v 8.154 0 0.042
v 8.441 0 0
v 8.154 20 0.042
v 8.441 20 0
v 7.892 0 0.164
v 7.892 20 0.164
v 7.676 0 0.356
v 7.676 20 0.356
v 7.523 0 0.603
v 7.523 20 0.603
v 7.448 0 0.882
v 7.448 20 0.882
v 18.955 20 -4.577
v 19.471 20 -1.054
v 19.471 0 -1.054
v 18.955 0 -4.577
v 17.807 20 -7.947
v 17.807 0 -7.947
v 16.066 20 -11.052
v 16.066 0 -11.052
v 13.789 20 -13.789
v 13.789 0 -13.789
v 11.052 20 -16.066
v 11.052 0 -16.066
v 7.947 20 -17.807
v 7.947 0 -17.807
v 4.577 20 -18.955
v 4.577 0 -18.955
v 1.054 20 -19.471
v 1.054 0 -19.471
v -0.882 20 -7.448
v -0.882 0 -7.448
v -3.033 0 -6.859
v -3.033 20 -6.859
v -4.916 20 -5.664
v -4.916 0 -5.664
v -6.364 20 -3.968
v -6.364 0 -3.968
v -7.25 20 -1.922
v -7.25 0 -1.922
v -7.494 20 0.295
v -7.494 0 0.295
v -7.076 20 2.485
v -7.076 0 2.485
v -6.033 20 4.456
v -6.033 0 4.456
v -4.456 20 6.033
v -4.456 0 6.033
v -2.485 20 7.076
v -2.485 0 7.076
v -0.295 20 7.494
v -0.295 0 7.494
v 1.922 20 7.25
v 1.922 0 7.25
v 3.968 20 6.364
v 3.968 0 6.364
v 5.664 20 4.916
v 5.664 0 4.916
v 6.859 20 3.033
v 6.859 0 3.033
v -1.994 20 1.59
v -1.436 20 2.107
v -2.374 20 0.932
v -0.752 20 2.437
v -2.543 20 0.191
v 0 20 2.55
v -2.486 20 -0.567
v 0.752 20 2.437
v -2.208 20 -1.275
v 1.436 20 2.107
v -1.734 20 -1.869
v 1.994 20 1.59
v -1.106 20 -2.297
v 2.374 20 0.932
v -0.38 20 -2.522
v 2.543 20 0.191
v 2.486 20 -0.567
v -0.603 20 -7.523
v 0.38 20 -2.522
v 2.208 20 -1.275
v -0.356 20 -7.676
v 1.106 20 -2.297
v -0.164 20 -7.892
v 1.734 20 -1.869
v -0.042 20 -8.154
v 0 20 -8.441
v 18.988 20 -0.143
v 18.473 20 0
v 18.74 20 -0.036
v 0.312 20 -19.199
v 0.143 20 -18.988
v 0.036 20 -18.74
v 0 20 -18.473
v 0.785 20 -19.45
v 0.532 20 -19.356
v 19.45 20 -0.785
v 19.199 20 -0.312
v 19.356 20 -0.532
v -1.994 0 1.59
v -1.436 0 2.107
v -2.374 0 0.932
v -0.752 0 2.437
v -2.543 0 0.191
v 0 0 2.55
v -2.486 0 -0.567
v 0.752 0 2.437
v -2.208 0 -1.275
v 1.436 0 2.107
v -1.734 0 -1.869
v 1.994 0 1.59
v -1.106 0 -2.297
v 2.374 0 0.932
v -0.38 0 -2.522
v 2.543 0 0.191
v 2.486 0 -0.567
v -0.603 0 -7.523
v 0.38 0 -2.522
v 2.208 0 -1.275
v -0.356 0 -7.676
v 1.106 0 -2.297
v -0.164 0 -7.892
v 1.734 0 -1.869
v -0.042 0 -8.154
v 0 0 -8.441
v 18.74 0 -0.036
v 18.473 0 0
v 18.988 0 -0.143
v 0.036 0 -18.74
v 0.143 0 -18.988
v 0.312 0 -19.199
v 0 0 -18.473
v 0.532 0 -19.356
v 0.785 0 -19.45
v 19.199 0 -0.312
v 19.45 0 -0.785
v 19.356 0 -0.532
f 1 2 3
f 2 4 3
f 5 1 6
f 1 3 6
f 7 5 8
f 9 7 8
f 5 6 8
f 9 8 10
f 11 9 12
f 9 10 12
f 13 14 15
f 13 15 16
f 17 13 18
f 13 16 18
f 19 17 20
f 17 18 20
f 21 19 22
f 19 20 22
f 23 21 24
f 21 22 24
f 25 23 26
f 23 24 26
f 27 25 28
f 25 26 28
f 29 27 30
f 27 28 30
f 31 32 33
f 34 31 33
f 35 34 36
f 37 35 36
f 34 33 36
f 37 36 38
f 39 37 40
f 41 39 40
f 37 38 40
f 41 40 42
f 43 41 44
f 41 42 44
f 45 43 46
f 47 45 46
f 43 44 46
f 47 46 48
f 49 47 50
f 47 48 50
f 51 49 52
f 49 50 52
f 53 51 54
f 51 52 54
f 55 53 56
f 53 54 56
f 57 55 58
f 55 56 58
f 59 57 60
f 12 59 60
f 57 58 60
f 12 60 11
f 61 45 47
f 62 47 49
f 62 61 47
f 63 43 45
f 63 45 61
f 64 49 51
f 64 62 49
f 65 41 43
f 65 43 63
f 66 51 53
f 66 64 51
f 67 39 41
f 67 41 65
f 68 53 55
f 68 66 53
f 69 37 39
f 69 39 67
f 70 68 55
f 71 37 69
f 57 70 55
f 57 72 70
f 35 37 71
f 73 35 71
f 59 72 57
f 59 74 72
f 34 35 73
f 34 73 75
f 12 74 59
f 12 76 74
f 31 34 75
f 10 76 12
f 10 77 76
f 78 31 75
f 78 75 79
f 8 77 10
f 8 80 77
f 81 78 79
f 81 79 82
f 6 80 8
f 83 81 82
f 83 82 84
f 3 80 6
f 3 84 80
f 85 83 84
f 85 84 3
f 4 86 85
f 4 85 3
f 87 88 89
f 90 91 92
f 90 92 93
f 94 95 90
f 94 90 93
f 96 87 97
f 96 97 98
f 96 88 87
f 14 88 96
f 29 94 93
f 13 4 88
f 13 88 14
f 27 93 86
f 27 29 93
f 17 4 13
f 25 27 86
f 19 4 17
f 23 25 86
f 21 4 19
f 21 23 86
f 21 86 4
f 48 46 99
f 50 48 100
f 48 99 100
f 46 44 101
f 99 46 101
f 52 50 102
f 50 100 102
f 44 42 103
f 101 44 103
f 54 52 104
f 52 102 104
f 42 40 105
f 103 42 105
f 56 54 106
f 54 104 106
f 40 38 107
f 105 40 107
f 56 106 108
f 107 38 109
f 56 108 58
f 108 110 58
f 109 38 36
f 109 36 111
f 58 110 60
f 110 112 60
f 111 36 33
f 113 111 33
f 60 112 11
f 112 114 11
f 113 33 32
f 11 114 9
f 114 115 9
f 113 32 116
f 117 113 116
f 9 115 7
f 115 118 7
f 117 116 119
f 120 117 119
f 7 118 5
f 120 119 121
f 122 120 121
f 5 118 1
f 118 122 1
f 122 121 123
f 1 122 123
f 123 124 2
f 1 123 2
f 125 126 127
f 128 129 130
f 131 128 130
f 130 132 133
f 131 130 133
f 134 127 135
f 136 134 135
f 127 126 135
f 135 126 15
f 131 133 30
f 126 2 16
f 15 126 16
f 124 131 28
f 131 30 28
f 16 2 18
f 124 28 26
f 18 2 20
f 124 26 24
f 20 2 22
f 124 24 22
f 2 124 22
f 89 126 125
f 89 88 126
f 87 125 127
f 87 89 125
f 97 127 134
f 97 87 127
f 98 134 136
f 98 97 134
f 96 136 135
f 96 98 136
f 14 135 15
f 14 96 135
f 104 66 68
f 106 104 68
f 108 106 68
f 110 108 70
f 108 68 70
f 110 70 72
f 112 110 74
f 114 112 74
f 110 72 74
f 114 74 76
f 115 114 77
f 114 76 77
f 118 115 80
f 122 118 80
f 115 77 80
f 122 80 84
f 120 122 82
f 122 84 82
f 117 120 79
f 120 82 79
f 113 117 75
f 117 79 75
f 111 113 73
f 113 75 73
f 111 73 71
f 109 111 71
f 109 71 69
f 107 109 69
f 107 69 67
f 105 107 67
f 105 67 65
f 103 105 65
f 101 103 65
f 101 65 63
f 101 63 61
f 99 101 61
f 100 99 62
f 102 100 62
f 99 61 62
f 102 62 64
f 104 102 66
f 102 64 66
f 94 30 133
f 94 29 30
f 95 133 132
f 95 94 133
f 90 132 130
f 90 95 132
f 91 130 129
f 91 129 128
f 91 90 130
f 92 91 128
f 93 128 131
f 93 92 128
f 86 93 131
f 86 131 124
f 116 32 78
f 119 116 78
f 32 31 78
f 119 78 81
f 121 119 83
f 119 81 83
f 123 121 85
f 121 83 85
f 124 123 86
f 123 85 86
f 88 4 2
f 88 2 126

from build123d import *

# Parameters (mm, degrees)
BOSS_EXTRUDE2_DEPTH = 20
SKETCH2_R           = 2.55
CUT_EXTRUDE1_DEPTH  = 20
FILLET1_R           = 1


with BuildPart() as part:
    # Sketch1 → Boss-Extrude2 (new body)
    with BuildSketch(Plane(origin=(0, 0, 0), x_dir=(1, 0, 0), z_dir=(0, 1, 0))):
        with BuildLine():
            Line((7.5, 0), (19.5, 0))
            ThreePointArc((19.5, 0), (13.788582233, 13.788582233), (0, 19.5))
            Line((0, 19.5), (0, 7.5))
            ThreePointArc((0, 7.5), (-5.303300859, -5.303300859), (7.5, 0))
        make_face()
    extrude(amount=BOSS_EXTRUDE2_DEPTH)

    # Sketch2 → Cut-Extrude1 (cut)
    with BuildSketch(Plane(origin=(0, 20, 0), x_dir=(1, 0, 0), z_dir=(0, 1, 0))):
        with Locations(Location((0, 0, 0), (0, 0, 270))):
            Circle(SKETCH2_R)
    extrude(amount=-CUT_EXTRUDE1_DEPTH, mode=Mode.SUBTRACT)

    # Fillet1
    fillet1_edges = [part.edges().sort_by_distance(p)[0] for p in [
        (0, 10, -7.5),
        (0, 10, -19.5),
        (19.5, 10, 0),
        (7.5, 10, 0),
    ]]
    fillet(fillet1_edges, radius=FILLET1_R)


solid = part.part
